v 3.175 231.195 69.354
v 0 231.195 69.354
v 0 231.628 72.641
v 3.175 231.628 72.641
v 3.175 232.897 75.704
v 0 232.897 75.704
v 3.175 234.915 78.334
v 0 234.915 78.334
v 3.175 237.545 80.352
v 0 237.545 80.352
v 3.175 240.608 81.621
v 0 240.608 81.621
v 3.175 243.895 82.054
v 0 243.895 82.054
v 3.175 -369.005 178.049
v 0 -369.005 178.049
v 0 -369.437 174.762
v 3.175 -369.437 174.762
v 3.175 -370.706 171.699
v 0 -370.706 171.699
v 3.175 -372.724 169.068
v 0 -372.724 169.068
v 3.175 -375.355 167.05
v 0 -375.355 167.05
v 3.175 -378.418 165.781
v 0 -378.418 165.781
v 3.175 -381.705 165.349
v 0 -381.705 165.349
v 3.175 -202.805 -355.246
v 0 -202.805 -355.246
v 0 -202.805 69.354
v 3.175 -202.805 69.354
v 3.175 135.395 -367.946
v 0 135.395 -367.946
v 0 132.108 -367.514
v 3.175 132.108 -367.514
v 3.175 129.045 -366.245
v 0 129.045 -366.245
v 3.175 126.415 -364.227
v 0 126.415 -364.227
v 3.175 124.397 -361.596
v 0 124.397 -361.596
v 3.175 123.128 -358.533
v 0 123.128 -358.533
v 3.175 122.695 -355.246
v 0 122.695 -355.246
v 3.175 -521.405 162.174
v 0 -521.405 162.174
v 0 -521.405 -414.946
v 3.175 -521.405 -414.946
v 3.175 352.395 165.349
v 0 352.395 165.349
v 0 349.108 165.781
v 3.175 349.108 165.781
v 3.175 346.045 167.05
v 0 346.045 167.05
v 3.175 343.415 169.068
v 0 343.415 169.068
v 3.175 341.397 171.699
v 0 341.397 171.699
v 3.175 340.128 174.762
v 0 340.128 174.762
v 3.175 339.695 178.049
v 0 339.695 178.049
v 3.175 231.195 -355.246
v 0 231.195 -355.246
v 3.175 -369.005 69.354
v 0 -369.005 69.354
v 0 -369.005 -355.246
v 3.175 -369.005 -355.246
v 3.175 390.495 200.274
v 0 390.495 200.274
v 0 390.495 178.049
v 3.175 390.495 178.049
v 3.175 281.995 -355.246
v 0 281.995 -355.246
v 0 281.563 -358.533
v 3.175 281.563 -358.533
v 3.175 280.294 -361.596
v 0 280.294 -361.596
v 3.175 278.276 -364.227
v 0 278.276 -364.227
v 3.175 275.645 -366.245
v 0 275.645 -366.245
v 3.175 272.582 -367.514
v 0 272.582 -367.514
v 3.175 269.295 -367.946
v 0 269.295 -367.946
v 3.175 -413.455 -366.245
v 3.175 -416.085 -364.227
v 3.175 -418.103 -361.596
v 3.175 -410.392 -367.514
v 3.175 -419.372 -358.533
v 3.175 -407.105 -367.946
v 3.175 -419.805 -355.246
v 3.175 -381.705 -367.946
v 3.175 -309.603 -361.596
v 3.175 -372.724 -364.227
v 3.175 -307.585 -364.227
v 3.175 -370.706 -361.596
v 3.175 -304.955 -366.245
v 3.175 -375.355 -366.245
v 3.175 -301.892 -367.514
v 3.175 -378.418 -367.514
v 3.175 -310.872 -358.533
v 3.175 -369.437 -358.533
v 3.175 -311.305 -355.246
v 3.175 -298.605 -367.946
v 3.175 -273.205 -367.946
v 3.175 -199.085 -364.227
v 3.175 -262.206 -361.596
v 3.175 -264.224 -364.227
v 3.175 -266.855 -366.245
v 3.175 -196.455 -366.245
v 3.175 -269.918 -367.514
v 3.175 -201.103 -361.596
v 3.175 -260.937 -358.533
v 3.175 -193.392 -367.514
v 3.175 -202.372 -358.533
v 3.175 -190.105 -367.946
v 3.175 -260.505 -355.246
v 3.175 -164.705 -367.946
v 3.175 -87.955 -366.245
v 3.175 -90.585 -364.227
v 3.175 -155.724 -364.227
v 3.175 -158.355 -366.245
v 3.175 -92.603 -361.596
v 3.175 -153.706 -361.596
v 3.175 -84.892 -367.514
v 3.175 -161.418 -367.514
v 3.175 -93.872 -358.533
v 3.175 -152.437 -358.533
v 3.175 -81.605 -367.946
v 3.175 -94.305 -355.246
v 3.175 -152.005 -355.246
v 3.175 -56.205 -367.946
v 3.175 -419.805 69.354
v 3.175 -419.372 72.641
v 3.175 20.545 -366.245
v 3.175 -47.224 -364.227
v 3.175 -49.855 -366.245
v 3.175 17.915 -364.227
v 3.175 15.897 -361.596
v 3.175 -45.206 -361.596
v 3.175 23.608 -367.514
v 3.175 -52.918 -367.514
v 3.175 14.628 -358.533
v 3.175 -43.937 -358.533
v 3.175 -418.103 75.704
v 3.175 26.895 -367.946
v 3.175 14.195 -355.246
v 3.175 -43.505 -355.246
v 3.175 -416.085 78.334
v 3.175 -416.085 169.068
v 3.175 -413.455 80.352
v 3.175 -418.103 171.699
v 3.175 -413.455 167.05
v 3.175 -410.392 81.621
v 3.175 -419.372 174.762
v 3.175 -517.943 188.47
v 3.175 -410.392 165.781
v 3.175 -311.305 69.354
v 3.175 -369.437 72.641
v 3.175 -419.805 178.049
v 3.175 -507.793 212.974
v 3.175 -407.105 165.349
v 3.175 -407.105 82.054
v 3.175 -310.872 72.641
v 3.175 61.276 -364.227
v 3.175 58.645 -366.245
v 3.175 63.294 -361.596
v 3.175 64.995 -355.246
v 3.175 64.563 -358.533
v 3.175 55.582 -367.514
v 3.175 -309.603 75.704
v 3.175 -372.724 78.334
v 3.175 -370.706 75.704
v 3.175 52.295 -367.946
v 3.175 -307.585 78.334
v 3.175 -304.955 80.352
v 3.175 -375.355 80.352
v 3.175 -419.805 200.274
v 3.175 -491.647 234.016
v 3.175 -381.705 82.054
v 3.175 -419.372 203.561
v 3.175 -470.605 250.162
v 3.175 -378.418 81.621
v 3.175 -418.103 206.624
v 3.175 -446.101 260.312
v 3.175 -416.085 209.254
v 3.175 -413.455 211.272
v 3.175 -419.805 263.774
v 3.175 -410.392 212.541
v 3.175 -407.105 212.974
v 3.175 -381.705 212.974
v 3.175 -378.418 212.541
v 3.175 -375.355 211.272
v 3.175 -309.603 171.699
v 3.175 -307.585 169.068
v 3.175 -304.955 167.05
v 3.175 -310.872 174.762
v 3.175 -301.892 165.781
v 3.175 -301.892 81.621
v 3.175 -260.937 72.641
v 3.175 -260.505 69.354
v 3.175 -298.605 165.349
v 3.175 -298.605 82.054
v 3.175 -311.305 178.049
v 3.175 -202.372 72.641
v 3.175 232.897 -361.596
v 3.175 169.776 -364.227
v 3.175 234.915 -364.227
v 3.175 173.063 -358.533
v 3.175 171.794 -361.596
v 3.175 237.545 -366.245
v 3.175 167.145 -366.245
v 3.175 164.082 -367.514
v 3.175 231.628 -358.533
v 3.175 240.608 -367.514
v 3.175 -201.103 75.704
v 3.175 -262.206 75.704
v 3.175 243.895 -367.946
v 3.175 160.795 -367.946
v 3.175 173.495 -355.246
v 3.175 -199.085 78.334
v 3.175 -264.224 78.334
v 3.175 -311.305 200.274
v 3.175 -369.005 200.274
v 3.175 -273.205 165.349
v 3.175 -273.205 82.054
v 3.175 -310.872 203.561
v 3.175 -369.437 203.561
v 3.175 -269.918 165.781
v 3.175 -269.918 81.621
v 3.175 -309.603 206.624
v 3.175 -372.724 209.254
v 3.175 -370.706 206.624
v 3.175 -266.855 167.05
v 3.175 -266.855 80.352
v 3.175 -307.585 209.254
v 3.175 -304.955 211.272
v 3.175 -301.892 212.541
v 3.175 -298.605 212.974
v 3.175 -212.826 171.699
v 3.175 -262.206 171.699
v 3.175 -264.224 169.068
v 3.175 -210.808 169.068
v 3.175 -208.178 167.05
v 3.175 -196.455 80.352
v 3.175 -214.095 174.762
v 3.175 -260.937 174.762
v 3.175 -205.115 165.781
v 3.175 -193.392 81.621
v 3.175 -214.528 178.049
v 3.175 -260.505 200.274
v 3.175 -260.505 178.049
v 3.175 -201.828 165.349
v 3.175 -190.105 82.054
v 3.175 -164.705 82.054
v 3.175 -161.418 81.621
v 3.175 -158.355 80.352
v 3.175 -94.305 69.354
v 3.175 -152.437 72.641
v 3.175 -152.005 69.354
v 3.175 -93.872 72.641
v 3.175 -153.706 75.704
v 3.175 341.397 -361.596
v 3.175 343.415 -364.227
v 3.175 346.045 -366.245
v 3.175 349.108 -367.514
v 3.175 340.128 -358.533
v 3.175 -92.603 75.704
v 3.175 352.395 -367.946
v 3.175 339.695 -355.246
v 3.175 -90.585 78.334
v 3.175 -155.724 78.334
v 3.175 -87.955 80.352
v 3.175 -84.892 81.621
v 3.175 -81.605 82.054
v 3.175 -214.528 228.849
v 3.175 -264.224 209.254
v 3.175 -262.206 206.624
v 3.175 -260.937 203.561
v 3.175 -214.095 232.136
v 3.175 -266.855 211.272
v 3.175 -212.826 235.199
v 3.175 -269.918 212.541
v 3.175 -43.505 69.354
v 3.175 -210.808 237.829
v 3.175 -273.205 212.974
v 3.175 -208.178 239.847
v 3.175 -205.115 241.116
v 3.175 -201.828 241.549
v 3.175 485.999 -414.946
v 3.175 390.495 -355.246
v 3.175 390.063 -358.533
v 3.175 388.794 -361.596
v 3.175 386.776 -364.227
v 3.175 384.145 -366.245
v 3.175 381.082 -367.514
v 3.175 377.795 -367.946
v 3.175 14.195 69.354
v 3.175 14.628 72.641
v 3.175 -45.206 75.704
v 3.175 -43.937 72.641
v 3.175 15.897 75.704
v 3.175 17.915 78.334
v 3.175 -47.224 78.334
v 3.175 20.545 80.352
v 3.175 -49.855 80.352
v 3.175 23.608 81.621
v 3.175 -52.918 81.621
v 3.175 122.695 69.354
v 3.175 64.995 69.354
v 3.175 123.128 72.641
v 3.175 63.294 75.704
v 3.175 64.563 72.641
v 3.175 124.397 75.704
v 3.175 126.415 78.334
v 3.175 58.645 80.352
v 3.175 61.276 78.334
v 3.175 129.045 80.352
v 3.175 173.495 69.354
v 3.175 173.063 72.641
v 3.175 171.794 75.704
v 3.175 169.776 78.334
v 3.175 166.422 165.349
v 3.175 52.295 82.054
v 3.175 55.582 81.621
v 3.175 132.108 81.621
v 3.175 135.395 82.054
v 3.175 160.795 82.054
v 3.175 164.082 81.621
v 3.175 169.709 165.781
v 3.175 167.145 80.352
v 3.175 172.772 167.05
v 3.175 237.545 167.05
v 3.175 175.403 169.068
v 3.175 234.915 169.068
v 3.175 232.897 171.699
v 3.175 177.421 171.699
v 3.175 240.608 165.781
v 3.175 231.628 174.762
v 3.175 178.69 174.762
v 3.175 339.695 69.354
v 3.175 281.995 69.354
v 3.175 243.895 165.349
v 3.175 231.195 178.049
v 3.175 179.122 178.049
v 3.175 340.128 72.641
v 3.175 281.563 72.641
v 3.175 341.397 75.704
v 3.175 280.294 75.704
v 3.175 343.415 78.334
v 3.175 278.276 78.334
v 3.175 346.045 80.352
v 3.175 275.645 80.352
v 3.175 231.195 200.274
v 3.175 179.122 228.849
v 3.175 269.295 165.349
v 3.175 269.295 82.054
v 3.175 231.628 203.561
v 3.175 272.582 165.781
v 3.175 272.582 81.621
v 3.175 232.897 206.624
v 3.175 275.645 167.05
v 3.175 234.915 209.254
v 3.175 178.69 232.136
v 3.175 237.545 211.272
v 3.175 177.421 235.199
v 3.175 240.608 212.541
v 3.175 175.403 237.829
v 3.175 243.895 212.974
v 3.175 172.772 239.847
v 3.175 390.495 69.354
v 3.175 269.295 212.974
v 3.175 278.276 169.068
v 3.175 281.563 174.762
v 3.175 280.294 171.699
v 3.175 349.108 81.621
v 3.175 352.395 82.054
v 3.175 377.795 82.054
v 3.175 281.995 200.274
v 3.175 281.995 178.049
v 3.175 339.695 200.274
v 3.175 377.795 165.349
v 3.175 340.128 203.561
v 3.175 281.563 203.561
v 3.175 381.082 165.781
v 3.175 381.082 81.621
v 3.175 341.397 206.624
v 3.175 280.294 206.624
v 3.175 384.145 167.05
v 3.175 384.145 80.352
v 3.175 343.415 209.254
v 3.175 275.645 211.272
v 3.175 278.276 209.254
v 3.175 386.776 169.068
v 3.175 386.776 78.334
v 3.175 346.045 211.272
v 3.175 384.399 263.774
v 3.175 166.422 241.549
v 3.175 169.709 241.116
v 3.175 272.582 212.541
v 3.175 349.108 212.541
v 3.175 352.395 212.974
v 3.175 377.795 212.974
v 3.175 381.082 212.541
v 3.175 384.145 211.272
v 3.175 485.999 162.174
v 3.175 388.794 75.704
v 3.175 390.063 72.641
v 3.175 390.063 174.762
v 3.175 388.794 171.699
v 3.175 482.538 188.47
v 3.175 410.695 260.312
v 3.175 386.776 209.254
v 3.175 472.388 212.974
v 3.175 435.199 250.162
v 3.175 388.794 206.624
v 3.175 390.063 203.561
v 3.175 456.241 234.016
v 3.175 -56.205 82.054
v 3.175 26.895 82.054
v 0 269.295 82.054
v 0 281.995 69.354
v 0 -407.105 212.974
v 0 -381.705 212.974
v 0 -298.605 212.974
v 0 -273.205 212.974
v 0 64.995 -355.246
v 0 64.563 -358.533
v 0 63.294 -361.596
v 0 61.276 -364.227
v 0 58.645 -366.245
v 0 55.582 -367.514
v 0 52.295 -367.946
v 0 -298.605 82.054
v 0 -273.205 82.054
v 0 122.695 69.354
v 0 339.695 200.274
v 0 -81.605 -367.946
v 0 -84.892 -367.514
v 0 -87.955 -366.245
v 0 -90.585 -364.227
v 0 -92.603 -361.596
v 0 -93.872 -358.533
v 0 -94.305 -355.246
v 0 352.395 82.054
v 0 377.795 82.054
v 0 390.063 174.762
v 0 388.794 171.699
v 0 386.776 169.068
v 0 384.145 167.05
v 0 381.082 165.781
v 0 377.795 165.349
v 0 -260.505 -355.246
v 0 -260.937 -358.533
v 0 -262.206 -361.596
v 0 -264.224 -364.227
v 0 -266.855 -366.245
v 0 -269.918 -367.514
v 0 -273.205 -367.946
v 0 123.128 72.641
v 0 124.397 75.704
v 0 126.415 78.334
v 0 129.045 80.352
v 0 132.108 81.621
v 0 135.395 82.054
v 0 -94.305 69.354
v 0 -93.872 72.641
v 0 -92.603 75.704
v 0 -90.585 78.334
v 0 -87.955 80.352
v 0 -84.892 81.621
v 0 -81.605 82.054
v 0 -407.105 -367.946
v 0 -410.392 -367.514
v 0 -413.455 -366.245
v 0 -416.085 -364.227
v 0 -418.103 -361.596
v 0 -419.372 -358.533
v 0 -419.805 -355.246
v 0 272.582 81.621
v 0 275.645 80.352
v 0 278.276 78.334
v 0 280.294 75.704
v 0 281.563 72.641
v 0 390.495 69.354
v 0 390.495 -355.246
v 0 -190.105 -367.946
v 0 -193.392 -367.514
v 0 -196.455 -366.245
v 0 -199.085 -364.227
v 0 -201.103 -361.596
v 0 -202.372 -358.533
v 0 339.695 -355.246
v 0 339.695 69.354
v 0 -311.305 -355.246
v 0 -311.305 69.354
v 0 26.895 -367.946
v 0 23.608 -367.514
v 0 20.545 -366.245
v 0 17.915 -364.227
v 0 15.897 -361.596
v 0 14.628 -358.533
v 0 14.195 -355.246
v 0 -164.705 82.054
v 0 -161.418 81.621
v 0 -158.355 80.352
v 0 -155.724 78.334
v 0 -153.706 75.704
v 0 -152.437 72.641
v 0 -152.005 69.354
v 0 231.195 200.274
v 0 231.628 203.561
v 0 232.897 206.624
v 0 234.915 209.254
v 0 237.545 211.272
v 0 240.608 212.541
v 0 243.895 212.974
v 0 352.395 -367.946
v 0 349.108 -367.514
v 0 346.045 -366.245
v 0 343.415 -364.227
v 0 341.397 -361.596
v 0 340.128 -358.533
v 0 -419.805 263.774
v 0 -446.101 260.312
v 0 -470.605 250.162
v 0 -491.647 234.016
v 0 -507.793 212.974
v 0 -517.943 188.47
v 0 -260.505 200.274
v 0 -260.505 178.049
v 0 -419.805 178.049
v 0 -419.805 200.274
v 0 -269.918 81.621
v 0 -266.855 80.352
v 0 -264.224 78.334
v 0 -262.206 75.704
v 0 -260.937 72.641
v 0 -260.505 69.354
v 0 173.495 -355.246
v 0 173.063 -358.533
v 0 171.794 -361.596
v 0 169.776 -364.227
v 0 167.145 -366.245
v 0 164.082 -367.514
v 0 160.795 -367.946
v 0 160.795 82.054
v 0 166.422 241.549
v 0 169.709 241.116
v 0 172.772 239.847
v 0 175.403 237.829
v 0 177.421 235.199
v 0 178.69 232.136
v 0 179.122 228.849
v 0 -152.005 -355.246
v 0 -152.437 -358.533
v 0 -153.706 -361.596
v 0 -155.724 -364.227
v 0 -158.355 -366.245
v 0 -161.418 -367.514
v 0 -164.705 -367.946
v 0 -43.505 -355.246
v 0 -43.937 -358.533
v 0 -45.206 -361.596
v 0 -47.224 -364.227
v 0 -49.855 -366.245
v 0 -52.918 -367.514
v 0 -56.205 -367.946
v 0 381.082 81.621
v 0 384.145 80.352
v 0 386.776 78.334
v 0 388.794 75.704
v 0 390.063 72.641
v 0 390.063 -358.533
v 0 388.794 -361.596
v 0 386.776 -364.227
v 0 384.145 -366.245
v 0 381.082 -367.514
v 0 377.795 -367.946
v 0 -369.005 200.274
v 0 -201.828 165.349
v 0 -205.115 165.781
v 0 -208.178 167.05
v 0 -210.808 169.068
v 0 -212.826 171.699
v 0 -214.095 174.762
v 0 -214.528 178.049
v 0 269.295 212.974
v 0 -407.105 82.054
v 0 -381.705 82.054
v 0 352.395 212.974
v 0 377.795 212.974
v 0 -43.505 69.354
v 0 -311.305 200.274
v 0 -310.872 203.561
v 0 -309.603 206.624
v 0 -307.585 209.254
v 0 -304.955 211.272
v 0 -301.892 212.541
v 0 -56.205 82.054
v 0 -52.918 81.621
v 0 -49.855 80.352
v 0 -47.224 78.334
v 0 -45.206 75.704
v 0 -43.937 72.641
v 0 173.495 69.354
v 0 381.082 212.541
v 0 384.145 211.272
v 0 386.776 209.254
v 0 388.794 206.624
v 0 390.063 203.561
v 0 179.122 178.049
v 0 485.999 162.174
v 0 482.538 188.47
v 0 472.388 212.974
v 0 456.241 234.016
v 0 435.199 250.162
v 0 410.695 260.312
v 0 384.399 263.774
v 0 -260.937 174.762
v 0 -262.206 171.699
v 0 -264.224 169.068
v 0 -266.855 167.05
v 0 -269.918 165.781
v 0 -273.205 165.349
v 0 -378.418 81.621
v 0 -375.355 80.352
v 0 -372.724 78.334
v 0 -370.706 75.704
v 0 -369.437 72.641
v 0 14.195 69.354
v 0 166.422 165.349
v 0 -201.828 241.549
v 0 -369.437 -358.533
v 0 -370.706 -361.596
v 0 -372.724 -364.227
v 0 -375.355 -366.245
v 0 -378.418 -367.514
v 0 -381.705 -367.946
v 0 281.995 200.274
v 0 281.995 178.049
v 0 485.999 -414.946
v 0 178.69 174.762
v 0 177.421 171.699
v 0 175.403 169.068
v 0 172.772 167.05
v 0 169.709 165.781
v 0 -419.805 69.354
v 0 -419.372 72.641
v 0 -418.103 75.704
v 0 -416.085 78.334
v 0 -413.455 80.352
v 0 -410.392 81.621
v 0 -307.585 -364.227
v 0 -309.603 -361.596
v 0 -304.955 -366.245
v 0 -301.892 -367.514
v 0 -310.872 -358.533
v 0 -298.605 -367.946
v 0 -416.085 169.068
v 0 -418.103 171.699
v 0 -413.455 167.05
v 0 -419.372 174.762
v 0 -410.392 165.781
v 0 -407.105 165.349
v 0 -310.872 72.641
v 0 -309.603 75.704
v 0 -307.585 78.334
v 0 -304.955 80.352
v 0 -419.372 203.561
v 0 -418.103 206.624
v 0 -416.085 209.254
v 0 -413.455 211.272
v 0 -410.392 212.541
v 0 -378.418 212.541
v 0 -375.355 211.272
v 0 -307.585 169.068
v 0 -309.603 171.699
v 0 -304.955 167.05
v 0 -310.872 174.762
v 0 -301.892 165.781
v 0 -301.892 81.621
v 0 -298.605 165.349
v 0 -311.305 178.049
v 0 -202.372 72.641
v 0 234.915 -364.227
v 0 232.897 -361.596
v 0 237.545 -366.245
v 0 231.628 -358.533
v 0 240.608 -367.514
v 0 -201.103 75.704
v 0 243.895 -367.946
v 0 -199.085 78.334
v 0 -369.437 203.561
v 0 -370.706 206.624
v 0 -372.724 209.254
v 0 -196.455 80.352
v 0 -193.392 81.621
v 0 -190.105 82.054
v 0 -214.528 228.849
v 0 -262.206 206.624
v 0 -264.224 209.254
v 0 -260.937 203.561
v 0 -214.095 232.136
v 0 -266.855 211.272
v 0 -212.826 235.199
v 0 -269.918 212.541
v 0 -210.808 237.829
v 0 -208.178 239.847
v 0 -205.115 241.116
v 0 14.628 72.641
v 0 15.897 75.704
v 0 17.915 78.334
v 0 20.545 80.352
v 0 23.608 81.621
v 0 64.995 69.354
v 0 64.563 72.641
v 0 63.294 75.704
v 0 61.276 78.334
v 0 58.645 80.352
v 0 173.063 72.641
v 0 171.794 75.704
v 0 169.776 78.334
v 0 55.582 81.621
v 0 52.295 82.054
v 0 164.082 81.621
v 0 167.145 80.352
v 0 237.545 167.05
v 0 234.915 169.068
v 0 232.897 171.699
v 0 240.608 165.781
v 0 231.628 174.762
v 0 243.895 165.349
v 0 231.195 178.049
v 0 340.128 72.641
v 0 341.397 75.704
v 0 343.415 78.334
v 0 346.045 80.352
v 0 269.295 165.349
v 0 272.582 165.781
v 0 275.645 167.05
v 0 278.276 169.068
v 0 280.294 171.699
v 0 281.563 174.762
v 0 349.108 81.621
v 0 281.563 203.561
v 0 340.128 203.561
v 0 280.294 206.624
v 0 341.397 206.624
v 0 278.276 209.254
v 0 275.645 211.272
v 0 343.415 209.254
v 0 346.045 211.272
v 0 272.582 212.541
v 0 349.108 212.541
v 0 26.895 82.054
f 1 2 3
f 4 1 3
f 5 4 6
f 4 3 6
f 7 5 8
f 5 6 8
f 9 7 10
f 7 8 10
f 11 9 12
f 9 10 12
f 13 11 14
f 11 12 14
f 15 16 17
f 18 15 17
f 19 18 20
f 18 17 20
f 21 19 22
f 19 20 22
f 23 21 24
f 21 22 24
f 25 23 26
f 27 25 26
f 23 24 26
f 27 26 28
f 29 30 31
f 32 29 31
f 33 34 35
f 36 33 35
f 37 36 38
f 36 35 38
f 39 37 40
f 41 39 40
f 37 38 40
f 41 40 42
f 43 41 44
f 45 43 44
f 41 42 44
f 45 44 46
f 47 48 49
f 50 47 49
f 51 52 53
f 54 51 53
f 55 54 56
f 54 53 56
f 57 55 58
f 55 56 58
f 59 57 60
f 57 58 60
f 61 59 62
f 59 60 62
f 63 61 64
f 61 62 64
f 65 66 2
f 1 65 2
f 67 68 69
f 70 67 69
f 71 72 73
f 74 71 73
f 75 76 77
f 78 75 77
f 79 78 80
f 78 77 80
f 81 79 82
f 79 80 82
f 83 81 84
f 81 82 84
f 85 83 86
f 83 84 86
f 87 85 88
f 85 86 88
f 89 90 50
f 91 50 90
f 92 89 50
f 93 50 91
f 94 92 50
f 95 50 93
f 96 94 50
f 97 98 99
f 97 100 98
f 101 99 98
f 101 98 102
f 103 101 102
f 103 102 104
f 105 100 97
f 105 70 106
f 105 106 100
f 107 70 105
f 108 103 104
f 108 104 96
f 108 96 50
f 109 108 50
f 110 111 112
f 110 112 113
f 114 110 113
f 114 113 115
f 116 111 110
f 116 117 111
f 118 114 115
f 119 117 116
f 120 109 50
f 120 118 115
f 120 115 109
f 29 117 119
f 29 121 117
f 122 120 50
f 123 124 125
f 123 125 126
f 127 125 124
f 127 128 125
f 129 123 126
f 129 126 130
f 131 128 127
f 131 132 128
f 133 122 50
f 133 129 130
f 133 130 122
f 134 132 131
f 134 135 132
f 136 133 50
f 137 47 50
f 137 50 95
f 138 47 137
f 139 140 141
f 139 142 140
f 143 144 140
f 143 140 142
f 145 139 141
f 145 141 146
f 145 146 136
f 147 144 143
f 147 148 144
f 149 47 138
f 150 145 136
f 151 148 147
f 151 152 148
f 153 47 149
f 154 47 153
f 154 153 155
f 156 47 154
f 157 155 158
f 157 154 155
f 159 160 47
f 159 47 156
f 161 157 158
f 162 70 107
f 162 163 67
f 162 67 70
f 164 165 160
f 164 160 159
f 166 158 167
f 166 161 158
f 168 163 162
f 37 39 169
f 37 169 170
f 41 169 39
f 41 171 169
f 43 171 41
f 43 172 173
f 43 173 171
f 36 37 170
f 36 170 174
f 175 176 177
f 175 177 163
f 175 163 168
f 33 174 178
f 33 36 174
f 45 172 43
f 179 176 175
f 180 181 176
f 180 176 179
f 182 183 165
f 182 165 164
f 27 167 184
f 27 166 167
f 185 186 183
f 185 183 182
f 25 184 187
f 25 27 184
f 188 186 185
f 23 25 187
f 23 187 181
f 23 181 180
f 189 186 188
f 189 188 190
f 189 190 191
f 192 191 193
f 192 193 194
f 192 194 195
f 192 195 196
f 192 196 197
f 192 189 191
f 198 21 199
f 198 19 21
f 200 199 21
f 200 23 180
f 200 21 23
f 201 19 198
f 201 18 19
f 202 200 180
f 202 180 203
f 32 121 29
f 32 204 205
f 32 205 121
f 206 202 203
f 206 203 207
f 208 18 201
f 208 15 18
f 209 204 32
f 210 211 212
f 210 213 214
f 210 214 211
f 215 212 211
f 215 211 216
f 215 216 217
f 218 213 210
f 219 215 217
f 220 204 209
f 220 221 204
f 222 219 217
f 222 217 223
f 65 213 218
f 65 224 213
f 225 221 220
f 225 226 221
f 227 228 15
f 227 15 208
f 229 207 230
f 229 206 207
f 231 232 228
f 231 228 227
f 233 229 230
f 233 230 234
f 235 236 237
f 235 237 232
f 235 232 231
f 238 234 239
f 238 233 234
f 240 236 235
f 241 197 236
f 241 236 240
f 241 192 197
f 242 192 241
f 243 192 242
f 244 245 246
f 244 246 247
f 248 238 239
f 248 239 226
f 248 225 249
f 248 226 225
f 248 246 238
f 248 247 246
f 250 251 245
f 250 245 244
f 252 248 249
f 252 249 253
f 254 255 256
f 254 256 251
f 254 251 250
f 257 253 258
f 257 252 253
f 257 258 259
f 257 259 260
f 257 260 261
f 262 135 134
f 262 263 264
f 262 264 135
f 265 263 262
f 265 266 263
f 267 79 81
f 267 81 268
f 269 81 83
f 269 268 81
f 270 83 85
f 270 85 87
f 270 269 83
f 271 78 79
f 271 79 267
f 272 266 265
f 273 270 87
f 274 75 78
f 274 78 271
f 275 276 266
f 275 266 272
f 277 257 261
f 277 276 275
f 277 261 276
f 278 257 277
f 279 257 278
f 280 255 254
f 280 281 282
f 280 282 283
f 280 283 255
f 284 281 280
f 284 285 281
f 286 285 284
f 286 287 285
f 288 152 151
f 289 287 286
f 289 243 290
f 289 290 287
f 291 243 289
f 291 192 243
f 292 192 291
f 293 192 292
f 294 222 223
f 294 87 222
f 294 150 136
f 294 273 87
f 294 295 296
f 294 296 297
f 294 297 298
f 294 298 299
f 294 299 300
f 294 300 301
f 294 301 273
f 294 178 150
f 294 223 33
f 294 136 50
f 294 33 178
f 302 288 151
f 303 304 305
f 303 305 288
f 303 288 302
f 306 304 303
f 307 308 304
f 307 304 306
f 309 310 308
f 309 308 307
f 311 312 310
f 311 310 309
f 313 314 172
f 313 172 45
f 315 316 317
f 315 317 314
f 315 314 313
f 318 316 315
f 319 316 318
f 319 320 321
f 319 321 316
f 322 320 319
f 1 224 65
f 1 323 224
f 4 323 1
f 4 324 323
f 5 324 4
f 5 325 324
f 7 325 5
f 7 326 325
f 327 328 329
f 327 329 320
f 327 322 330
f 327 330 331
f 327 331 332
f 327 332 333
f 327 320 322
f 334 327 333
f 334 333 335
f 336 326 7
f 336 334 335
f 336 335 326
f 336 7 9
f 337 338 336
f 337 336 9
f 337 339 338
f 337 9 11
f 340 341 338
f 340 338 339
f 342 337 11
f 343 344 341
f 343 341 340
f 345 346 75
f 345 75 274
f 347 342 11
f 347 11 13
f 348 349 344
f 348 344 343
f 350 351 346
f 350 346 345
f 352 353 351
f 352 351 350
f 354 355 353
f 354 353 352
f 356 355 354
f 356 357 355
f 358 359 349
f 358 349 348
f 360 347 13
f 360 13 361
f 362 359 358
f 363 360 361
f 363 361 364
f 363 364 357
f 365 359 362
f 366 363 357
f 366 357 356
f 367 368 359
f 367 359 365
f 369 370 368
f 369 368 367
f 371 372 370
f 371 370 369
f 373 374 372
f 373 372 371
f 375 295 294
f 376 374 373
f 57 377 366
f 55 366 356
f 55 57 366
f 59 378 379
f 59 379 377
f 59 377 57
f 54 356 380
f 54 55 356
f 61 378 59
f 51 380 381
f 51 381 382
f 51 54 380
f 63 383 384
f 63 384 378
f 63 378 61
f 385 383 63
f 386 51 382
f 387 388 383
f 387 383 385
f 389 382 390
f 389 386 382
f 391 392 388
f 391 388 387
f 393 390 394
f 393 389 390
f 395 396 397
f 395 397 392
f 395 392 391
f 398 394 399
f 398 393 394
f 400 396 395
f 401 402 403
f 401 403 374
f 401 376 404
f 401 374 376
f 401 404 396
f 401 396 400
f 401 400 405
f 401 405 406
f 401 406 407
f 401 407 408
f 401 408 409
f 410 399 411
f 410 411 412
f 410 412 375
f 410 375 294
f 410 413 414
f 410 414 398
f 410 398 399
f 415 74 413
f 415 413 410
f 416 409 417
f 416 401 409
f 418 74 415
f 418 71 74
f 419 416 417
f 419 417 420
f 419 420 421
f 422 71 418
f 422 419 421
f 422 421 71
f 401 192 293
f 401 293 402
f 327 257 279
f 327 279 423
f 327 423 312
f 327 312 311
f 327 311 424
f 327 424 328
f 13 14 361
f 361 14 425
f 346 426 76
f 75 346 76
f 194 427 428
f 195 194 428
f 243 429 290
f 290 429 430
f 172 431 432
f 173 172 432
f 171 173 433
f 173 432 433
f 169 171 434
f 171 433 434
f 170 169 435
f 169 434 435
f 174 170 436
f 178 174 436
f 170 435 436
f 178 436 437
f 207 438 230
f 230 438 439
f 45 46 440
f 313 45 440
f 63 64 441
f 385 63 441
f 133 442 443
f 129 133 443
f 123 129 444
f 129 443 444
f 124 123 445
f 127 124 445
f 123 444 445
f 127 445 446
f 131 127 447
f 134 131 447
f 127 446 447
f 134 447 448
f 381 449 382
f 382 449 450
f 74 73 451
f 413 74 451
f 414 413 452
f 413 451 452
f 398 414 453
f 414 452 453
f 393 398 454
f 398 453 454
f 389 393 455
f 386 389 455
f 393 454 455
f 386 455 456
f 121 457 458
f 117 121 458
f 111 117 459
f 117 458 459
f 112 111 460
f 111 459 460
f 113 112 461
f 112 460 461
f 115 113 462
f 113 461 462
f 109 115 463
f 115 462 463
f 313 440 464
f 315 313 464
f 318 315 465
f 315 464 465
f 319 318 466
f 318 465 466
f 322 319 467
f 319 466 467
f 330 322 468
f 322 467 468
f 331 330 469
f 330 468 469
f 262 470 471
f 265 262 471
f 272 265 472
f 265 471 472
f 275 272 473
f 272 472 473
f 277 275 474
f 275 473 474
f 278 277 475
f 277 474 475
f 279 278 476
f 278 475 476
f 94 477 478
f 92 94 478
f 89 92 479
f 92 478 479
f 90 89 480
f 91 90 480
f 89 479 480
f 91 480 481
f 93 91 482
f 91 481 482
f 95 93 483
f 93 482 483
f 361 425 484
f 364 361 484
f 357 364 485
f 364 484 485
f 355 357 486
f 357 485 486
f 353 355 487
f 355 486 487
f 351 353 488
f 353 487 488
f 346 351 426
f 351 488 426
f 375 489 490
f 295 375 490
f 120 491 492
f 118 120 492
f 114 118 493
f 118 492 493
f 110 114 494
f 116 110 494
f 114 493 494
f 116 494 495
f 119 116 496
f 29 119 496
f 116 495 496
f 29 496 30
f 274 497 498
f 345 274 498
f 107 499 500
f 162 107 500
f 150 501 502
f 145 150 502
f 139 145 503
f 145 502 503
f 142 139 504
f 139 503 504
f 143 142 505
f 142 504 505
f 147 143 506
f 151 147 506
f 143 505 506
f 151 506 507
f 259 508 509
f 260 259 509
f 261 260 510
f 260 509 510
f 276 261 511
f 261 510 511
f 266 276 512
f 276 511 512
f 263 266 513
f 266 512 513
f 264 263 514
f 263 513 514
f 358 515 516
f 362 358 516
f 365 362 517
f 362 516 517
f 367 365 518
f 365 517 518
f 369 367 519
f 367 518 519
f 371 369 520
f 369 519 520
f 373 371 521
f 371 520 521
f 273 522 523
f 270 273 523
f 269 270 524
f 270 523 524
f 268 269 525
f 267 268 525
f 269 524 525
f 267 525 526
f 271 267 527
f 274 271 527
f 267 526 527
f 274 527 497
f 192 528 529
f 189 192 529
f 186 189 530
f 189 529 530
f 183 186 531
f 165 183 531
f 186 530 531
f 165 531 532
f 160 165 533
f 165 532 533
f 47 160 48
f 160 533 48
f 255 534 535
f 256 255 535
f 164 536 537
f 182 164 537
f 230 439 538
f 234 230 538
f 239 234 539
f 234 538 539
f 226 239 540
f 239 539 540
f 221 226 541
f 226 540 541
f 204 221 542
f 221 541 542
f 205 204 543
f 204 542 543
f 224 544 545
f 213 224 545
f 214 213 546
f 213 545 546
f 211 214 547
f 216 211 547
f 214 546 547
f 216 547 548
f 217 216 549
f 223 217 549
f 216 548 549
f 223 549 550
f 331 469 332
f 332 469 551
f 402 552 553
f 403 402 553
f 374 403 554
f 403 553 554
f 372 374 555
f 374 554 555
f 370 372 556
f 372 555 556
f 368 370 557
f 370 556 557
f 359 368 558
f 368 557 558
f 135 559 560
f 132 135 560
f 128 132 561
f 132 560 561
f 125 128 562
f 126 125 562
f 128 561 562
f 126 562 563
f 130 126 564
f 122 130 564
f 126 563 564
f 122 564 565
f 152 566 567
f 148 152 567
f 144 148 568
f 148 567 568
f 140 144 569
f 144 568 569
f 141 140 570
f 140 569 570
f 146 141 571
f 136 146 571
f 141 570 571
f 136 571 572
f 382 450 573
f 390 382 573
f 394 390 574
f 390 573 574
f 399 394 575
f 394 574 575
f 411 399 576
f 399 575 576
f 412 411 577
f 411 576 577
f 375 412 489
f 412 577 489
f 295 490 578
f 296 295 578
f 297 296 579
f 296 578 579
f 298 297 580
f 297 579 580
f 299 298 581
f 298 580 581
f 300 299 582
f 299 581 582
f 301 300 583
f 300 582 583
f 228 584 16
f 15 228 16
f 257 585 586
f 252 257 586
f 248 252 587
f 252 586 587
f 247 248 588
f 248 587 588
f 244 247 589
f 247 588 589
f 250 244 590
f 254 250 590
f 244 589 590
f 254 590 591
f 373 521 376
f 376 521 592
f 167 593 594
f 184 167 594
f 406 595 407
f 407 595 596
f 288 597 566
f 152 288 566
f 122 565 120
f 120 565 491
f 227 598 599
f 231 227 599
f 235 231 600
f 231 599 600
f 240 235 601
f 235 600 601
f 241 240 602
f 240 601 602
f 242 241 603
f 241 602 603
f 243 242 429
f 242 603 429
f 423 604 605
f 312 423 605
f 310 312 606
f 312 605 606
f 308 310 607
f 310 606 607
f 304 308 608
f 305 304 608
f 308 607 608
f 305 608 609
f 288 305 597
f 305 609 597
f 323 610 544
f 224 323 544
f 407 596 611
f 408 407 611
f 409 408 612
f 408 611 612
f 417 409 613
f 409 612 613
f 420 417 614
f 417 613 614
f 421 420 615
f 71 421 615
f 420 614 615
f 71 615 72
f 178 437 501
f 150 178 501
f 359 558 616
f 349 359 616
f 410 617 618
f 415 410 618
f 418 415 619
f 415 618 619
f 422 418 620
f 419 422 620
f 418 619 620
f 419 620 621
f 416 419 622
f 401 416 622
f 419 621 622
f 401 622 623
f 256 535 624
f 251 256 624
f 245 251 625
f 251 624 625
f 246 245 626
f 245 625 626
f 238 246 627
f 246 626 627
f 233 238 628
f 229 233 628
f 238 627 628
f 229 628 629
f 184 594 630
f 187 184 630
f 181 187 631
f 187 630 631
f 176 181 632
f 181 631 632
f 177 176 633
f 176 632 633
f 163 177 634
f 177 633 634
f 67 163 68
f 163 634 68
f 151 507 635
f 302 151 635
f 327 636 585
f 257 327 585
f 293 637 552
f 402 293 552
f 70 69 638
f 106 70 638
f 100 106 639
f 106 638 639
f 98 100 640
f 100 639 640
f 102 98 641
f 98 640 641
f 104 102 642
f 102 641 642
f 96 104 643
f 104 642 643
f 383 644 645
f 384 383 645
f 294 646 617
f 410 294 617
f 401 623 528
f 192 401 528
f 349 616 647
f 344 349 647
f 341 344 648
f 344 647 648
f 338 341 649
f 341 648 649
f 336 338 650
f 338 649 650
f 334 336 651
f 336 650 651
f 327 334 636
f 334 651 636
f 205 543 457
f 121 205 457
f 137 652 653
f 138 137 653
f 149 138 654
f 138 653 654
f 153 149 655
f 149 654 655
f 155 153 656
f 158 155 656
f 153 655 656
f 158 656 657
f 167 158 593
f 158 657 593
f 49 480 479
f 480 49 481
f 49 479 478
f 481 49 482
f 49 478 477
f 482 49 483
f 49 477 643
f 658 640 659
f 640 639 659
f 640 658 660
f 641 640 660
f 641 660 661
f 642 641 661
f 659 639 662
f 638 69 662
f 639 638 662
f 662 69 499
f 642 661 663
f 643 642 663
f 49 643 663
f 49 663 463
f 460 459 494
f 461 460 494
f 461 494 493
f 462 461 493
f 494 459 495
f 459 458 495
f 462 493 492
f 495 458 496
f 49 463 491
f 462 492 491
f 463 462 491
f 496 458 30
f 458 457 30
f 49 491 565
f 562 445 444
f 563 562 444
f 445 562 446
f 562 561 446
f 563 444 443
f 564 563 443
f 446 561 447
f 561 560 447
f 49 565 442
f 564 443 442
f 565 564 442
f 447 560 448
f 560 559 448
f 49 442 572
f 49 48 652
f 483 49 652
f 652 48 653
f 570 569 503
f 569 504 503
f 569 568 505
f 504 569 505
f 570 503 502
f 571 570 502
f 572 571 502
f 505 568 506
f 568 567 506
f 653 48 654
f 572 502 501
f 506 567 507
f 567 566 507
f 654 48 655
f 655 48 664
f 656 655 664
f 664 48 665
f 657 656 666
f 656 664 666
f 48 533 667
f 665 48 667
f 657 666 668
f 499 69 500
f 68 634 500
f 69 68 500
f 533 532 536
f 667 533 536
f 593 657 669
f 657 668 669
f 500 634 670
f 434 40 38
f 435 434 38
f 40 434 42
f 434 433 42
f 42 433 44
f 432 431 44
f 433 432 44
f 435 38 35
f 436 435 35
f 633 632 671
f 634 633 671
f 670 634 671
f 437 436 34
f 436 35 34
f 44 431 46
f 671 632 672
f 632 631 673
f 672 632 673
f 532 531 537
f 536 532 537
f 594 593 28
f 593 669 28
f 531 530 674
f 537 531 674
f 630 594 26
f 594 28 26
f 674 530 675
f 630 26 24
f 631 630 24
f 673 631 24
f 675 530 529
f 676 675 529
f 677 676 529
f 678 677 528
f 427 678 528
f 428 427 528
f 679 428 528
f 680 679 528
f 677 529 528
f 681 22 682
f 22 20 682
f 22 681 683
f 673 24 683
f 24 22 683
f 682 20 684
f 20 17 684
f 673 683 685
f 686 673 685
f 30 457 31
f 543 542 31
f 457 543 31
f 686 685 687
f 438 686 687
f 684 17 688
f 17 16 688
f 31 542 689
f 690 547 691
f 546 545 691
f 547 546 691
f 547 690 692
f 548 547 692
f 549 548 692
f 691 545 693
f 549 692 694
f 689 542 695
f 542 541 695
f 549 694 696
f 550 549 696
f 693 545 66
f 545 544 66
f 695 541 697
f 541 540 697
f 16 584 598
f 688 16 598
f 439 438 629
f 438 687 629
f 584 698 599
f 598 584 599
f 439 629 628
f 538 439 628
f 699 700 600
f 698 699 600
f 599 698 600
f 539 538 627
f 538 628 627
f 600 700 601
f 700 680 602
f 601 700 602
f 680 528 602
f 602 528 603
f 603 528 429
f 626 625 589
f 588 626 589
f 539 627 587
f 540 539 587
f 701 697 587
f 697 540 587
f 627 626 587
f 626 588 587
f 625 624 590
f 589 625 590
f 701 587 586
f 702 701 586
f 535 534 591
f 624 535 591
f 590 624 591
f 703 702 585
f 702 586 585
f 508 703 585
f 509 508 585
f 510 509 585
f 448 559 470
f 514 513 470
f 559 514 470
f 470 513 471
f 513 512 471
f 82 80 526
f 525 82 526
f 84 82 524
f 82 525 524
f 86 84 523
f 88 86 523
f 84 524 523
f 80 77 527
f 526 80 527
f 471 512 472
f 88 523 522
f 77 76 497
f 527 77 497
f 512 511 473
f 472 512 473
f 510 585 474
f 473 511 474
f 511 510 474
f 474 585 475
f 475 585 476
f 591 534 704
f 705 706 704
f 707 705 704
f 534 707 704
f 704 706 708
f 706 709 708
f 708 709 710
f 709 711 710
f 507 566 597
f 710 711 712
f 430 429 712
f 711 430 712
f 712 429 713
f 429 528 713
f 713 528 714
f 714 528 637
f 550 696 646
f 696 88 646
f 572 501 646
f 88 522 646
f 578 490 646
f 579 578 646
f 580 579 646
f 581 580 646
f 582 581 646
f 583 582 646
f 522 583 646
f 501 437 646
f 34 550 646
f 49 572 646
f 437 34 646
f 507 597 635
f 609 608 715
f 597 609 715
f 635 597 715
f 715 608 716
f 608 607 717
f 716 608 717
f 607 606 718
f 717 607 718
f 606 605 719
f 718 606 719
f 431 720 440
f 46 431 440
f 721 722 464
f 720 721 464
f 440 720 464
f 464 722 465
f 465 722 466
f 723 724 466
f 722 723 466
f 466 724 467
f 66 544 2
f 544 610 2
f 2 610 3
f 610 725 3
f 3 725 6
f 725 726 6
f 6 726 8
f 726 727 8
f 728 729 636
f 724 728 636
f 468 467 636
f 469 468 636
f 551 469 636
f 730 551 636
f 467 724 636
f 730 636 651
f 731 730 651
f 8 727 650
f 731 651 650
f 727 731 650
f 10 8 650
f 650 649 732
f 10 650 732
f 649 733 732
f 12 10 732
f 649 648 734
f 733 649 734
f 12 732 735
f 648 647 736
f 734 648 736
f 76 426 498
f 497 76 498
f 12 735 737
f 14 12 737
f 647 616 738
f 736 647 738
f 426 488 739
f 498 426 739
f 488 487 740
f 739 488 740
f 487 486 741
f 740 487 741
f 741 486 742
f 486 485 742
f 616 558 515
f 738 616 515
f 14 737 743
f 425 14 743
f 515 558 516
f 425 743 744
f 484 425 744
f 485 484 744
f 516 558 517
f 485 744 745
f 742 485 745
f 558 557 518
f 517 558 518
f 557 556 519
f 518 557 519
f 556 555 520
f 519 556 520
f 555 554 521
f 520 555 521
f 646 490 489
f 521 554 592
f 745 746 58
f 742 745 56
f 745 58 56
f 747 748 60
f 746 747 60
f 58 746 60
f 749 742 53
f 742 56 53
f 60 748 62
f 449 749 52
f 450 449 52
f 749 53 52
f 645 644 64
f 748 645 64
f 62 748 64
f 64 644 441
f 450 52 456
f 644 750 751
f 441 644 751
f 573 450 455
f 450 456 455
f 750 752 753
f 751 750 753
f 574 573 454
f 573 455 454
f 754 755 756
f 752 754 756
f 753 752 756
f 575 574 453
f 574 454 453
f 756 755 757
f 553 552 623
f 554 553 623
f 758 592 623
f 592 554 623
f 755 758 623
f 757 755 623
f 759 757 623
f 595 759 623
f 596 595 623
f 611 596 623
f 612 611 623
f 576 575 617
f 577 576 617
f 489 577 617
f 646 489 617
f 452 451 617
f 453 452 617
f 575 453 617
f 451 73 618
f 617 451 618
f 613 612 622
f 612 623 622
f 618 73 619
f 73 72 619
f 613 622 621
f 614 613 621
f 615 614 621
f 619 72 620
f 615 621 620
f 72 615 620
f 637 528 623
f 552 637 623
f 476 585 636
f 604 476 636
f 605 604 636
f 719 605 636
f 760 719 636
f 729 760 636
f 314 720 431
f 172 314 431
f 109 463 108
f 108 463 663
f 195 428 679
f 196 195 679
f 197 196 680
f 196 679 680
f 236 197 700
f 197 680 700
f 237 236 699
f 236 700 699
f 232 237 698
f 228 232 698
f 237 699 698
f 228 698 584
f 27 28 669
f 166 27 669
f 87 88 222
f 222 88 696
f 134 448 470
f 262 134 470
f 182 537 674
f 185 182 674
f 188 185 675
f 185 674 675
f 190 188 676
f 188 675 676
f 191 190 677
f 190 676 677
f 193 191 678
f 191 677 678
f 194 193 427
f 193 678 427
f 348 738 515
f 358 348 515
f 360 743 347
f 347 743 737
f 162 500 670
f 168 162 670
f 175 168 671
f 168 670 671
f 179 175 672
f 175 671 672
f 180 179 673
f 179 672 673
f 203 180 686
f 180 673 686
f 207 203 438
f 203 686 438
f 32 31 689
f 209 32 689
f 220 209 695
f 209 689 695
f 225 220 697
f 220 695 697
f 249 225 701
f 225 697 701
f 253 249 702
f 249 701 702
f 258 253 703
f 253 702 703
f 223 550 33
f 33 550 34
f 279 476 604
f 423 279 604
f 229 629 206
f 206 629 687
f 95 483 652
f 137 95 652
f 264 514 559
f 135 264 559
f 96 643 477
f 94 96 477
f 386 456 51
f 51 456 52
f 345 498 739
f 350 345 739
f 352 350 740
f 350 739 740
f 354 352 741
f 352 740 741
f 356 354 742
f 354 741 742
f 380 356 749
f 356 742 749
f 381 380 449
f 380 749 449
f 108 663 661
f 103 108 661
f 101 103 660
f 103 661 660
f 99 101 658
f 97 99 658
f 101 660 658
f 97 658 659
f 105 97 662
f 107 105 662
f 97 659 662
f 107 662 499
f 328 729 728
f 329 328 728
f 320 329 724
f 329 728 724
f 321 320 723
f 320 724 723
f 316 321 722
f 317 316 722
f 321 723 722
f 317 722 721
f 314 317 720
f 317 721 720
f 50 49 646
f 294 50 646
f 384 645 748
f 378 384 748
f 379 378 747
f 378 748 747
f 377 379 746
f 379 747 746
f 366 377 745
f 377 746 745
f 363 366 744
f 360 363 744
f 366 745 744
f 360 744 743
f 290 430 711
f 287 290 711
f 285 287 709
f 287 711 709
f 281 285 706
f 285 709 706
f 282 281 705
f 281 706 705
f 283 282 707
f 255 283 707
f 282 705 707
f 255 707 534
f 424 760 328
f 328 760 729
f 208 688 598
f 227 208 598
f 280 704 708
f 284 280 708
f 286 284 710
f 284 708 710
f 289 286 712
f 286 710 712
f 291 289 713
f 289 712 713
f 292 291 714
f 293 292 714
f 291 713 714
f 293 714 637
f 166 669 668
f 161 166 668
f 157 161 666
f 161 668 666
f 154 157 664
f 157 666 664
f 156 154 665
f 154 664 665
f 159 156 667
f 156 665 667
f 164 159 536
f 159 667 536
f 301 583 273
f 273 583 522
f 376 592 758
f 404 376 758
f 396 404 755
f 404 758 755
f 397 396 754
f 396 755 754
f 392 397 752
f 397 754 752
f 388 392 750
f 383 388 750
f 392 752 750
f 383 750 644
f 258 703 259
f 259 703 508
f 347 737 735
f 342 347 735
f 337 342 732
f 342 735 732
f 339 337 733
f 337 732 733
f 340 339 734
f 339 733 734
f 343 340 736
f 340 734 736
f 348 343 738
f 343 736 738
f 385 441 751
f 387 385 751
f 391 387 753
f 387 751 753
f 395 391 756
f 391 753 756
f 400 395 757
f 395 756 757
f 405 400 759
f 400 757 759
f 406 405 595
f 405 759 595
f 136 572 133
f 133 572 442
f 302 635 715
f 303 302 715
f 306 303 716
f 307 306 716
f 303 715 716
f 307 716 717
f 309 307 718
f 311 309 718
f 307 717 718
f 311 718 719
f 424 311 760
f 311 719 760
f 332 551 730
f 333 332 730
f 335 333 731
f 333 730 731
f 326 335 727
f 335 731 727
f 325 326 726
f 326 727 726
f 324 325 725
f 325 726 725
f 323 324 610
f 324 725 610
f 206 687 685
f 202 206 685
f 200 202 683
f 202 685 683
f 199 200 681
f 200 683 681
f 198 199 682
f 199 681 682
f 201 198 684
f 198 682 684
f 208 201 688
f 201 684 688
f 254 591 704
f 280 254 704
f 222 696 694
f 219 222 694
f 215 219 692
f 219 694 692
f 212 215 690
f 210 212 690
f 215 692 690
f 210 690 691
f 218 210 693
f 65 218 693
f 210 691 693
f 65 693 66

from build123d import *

# Parameters (mm, degrees)
F1_DEPTH = 3.175


with BuildPart() as f1:
    # F0 (on Right) → F1 (new body)
    with BuildSketch(Plane.YZ):
        with BuildLine():
            ThreePointArc((-419.804555, 263.773604), (-491.646604, 234.015653), (-521.404555, 162.173604))
            Line((-521.404555, 162.173604), (-521.404555, -414.946396))
            Line((-521.404555, -414.946396), (485.999445, -414.946396))
            Line((485.999445, -414.946396), (485.999445, 162.173604))
            ThreePointArc((485.999445, 162.173604), (456.241494, 234.015653), (384.399445, 263.773604))
            Line((384.399445, 263.773604), (-17.702555, 263.773604))
            Line((-17.702555, 263.773604), (-419.804555, 263.773604))
        make_face()
        with BuildLine():
            ThreePointArc((-419.804548, 69.353524), (-416.084804, 78.33378), (-407.104548, 82.053524))
            Line((-407.104548, 82.053524), (-381.704548, 82.053524))
            ThreePointArc((-381.704548, 82.053524), (-372.724292, 78.33378), (-369.004548, 69.353524))
            Line((-369.004548, 69.353524), (-369.004548, -355.246476))
            ThreePointArc((-369.004548, -355.246476), (-372.724292, -364.226732), (-381.704548, -367.946476))
            Line((-381.704548, -367.946476), (-407.104548, -367.946476))
            ThreePointArc((-407.104548, -367.946476), (-416.084804, -364.226732), (-419.804548, -355.246476))
            Line((-419.804548, -355.246476), (-419.804548, 69.353524))
        make_face(mode=Mode.SUBTRACT)
        with BuildLine():
            Line((-311.304543, -355.246476), (-311.304543, 69.353524))
            ThreePointArc((-311.304543, 69.353524), (-307.584799, 78.33378), (-298.604543, 82.053524))
            Line((-298.604543, 82.053524), (-273.204543, 82.053524))
            ThreePointArc((-273.204543, 82.053524), (-264.224287, 78.33378), (-260.504543, 69.353524))
            Line((-260.504543, 69.353524), (-260.504543, -355.246476))
            ThreePointArc((-260.504543, -355.246476), (-264.224287, -364.226732), (-273.204543, -367.946476))
            Line((-273.204543, -367.946476), (-298.604543, -367.946476))
            ThreePointArc((-298.604543, -367.946476), (-307.584799, -364.226732), (-311.304543, -355.246476))
        make_face(mode=Mode.SUBTRACT)
        with BuildLine():
            Line((-202.804543, -355.246476), (-202.804543, 69.353524))
            ThreePointArc((-202.804543, 69.353524), (-199.084799, 78.33378), (-190.104543, 82.053524))
            Line((-190.104543, 82.053524), (-164.704543, 82.053524))
            ThreePointArc((-164.704543, 82.053524), (-155.724287, 78.33378), (-152.004543, 69.353524))
            Line((-152.004543, 69.353524), (-152.004543, -355.246476))
            ThreePointArc((-152.004543, -355.246476), (-155.724287, -364.226732), (-164.704543, -367.946476))
            Line((-164.704543, -367.946476), (-190.104543, -367.946476))
            ThreePointArc((-190.104543, -367.946476), (-199.084799, -364.226732), (-202.804543, -355.246476))
        make_face(mode=Mode.SUBTRACT)
        with BuildLine():
            Line((-94.304543, -355.246476), (-94.304543, 69.353524))
            ThreePointArc((-94.304543, 69.353524), (-90.584799, 78.33378), (-81.604543, 82.053524))
            Line((-81.604543, 82.053524), (-56.204543, 82.053524))
            ThreePointArc((-56.204543, 82.053524), (-47.224287, 78.33378), (-43.504543, 69.353524))
            Line((-43.504543, 69.353524), (-43.504543, -355.246476))
            ThreePointArc((-43.504543, -355.246476), (-47.224287, -364.226732), (-56.204543, -367.946476))
            Line((-56.204543, -367.946476), (-81.604543, -367.946476))
            ThreePointArc((-81.604543, -367.946476), (-90.584799, -364.226732), (-94.304543, -355.246476))
        make_face(mode=Mode.SUBTRACT)
        with BuildLine():
            Line((14.195457, -355.246476), (14.195457, 69.353524))
            ThreePointArc((14.195457, 69.353524), (17.915201, 78.33378), (26.895457, 82.053524))
            Line((26.895457, 82.053524), (52.295457, 82.053524))
            ThreePointArc((52.295457, 82.053524), (61.275713, 78.33378), (64.995457, 69.353524))
            Line((64.995457, 69.353524), (64.995457, -355.246476))
            ThreePointArc((64.995457, -355.246476), (61.275713, -364.226732), (52.295457, -367.946476))
            Line((52.295457, -367.946476), (26.895457, -367.946476))
            ThreePointArc((26.895457, -367.946476), (17.915201, -364.226732), (14.195457, -355.246476))
        make_face(mode=Mode.SUBTRACT)
        with BuildLine():
            Line((122.695457, -355.246476), (122.695457, 69.353524))
            ThreePointArc((122.695457, 69.353524), (126.415201, 78.33378), (135.395457, 82.053524))
            Line((135.395457, 82.053524), (160.795457, 82.053524))
            ThreePointArc((160.795457, 82.053524), (169.775713, 78.33378), (173.495457, 69.353524))
            Line((173.495457, 69.353524), (173.495457, -355.246476))
            ThreePointArc((173.495457, -355.246476), (169.775713, -364.226732), (160.795457, -367.946476))
            Line((160.795457, -367.946476), (135.395457, -367.946476))
            ThreePointArc((135.395457, -367.946476), (126.415201, -364.226732), (122.695457, -355.246476))
        make_face(mode=Mode.SUBTRACT)
        with BuildLine():
            Line((231.195457, -355.246476), (231.195457, 69.353524))
            ThreePointArc((231.195457, 69.353524), (234.915201, 78.33378), (243.895457, 82.053524))
            Line((243.895457, 82.053524), (269.295457, 82.053524))
            ThreePointArc((269.295457, 82.053524), (278.275713, 78.33378), (281.995457, 69.353524))
            Line((281.995457, 69.353524), (281.995457, -355.246476))
            ThreePointArc((281.995457, -355.246476), (278.275713, -364.226732), (269.295457, -367.946476))
            Line((269.295457, -367.946476), (243.895457, -367.946476))
            ThreePointArc((243.895457, -367.946476), (234.915201, -364.226732), (231.195457, -355.246476))
        make_face(mode=Mode.SUBTRACT)
        with BuildLine():
            Line((339.695457, -355.246476), (339.695457, 69.353524))
            ThreePointArc((339.695457, 69.353524), (343.415201, 78.33378), (352.395457, 82.053524))
            Line((352.395457, 82.053524), (377.795457, 82.053524))
            ThreePointArc((377.795457, 82.053524), (386.775713, 78.33378), (390.495457, 69.353524))
            Line((390.495457, 69.353524), (390.495457, -355.246476))
            ThreePointArc((390.495457, -355.246476), (386.775713, -364.226732), (377.795457, -367.946476))
            Line((377.795457, -367.946476), (352.395457, -367.946476))
            ThreePointArc((352.395457, -367.946476), (343.415201, -364.226732), (339.695457, -355.246476))
        make_face(mode=Mode.SUBTRACT)
        with BuildLine():
            ThreePointArc((-419.804553, 200.273602), (-416.08481, 209.253859), (-407.104553, 212.973604))
            Line((-407.104553, 212.973604), (-381.704548, 212.973604))
            ThreePointArc((-381.704548, 212.973604), (-372.724292, 209.25386), (-369.004548, 200.273604))
            Line((-369.004548, 200.273604), (-369.004548, 178.048524))
            ThreePointArc((-369.004548, 178.048524), (-372.724292, 169.068268), (-381.704548, 165.348524))
            Line((-381.704548, 165.348524), (-407.10455, 165.348524))
            ThreePointArc((-407.10455, 165.348524), (-416.084805, 169.068267), (-419.80455, 178.048522))
            Line((-419.80455, 178.048522), (-419.804553, 200.273602))
        make_face(mode=Mode.SUBTRACT)
        with BuildLine():
            ThreePointArc((-298.604543, 165.348524), (-307.584799, 169.068268), (-311.304543, 178.048524))
            Line((-311.304543, 178.048524), (-311.304543, 200.273604))
            ThreePointArc((-311.304543, 200.273604), (-307.584799, 209.25386), (-298.604543, 212.973604))
            Line((-298.604543, 212.973604), (-273.204543, 212.973604))
            ThreePointArc((-273.204543, 212.973604), (-264.224287, 209.25386), (-260.504543, 200.273604))
            Line((-260.504543, 200.273604), (-260.504543, 178.048524))
            ThreePointArc((-260.504543, 178.048524), (-264.224287, 169.068268), (-273.204543, 165.348524))
            Line((-273.204543, 165.348524), (-298.604543, 165.348524))
        make_face(mode=Mode.SUBTRACT)
        with BuildLine():
            Line((-201.827555, 241.548524), (-17.702555, 241.548524))
            Line((-17.702555, 241.548524), (166.422445, 241.548524))
            ThreePointArc((166.422445, 241.548524), (175.402701, 237.82878), (179.122445, 228.848524))
            Line((179.122445, 228.848524), (179.122445, 178.048524))
            ThreePointArc((179.122445, 178.048524), (175.402701, 169.068268), (166.422445, 165.348524))
            Line((166.422445, 165.348524), (-201.827555, 165.348524))
            ThreePointArc((-201.827555, 165.348524), (-210.807811, 169.068268), (-214.527555, 178.048524))
            Line((-214.527555, 178.048524), (-214.527555, 228.848524))
            ThreePointArc((-214.527555, 228.848524), (-210.807811, 237.82878), (-201.827555, 241.548524))
        make_face(mode=Mode.SUBTRACT)
        with BuildLine():
            ThreePointArc((243.895457, 165.348524), (234.915201, 169.068268), (231.195457, 178.048524))
            Line((231.195457, 178.048524), (231.195457, 200.273604))
            ThreePointArc((231.195457, 200.273604), (234.915201, 209.25386), (243.895457, 212.973604))
            Line((243.895457, 212.973604), (269.295457, 212.973604))
            ThreePointArc((269.295457, 212.973604), (278.275713, 209.25386), (281.995457, 200.273604))
            Line((281.995457, 200.273604), (281.995457, 178.048524))
            ThreePointArc((281.995457, 178.048524), (278.275713, 169.068268), (269.295457, 165.348524))
            Line((269.295457, 165.348524), (243.895457, 165.348524))
        make_face(mode=Mode.SUBTRACT)
        with BuildLine():
            ThreePointArc((352.395457, 165.348524), (343.415201, 169.068268), (339.695457, 178.048524))
            Line((339.695457, 178.048524), (339.695457, 200.273604))
            ThreePointArc((339.695457, 200.273604), (343.415201, 209.25386), (352.395457, 212.973604))
            Line((352.395457, 212.973604), (377.795457, 212.973604))
            ThreePointArc((377.795457, 212.973604), (386.775713, 209.25386), (390.495457, 200.273604))
            Line((390.495457, 200.273604), (390.495457, 178.048524))
            ThreePointArc((390.495457, 178.048524), (386.775713, 169.068268), (377.795457, 165.348524))
            Line((377.795457, 165.348524), (352.395457, 165.348524))
        make_face(mode=Mode.SUBTRACT)
    extrude(amount=F1_DEPTH)


solid = f1.part
